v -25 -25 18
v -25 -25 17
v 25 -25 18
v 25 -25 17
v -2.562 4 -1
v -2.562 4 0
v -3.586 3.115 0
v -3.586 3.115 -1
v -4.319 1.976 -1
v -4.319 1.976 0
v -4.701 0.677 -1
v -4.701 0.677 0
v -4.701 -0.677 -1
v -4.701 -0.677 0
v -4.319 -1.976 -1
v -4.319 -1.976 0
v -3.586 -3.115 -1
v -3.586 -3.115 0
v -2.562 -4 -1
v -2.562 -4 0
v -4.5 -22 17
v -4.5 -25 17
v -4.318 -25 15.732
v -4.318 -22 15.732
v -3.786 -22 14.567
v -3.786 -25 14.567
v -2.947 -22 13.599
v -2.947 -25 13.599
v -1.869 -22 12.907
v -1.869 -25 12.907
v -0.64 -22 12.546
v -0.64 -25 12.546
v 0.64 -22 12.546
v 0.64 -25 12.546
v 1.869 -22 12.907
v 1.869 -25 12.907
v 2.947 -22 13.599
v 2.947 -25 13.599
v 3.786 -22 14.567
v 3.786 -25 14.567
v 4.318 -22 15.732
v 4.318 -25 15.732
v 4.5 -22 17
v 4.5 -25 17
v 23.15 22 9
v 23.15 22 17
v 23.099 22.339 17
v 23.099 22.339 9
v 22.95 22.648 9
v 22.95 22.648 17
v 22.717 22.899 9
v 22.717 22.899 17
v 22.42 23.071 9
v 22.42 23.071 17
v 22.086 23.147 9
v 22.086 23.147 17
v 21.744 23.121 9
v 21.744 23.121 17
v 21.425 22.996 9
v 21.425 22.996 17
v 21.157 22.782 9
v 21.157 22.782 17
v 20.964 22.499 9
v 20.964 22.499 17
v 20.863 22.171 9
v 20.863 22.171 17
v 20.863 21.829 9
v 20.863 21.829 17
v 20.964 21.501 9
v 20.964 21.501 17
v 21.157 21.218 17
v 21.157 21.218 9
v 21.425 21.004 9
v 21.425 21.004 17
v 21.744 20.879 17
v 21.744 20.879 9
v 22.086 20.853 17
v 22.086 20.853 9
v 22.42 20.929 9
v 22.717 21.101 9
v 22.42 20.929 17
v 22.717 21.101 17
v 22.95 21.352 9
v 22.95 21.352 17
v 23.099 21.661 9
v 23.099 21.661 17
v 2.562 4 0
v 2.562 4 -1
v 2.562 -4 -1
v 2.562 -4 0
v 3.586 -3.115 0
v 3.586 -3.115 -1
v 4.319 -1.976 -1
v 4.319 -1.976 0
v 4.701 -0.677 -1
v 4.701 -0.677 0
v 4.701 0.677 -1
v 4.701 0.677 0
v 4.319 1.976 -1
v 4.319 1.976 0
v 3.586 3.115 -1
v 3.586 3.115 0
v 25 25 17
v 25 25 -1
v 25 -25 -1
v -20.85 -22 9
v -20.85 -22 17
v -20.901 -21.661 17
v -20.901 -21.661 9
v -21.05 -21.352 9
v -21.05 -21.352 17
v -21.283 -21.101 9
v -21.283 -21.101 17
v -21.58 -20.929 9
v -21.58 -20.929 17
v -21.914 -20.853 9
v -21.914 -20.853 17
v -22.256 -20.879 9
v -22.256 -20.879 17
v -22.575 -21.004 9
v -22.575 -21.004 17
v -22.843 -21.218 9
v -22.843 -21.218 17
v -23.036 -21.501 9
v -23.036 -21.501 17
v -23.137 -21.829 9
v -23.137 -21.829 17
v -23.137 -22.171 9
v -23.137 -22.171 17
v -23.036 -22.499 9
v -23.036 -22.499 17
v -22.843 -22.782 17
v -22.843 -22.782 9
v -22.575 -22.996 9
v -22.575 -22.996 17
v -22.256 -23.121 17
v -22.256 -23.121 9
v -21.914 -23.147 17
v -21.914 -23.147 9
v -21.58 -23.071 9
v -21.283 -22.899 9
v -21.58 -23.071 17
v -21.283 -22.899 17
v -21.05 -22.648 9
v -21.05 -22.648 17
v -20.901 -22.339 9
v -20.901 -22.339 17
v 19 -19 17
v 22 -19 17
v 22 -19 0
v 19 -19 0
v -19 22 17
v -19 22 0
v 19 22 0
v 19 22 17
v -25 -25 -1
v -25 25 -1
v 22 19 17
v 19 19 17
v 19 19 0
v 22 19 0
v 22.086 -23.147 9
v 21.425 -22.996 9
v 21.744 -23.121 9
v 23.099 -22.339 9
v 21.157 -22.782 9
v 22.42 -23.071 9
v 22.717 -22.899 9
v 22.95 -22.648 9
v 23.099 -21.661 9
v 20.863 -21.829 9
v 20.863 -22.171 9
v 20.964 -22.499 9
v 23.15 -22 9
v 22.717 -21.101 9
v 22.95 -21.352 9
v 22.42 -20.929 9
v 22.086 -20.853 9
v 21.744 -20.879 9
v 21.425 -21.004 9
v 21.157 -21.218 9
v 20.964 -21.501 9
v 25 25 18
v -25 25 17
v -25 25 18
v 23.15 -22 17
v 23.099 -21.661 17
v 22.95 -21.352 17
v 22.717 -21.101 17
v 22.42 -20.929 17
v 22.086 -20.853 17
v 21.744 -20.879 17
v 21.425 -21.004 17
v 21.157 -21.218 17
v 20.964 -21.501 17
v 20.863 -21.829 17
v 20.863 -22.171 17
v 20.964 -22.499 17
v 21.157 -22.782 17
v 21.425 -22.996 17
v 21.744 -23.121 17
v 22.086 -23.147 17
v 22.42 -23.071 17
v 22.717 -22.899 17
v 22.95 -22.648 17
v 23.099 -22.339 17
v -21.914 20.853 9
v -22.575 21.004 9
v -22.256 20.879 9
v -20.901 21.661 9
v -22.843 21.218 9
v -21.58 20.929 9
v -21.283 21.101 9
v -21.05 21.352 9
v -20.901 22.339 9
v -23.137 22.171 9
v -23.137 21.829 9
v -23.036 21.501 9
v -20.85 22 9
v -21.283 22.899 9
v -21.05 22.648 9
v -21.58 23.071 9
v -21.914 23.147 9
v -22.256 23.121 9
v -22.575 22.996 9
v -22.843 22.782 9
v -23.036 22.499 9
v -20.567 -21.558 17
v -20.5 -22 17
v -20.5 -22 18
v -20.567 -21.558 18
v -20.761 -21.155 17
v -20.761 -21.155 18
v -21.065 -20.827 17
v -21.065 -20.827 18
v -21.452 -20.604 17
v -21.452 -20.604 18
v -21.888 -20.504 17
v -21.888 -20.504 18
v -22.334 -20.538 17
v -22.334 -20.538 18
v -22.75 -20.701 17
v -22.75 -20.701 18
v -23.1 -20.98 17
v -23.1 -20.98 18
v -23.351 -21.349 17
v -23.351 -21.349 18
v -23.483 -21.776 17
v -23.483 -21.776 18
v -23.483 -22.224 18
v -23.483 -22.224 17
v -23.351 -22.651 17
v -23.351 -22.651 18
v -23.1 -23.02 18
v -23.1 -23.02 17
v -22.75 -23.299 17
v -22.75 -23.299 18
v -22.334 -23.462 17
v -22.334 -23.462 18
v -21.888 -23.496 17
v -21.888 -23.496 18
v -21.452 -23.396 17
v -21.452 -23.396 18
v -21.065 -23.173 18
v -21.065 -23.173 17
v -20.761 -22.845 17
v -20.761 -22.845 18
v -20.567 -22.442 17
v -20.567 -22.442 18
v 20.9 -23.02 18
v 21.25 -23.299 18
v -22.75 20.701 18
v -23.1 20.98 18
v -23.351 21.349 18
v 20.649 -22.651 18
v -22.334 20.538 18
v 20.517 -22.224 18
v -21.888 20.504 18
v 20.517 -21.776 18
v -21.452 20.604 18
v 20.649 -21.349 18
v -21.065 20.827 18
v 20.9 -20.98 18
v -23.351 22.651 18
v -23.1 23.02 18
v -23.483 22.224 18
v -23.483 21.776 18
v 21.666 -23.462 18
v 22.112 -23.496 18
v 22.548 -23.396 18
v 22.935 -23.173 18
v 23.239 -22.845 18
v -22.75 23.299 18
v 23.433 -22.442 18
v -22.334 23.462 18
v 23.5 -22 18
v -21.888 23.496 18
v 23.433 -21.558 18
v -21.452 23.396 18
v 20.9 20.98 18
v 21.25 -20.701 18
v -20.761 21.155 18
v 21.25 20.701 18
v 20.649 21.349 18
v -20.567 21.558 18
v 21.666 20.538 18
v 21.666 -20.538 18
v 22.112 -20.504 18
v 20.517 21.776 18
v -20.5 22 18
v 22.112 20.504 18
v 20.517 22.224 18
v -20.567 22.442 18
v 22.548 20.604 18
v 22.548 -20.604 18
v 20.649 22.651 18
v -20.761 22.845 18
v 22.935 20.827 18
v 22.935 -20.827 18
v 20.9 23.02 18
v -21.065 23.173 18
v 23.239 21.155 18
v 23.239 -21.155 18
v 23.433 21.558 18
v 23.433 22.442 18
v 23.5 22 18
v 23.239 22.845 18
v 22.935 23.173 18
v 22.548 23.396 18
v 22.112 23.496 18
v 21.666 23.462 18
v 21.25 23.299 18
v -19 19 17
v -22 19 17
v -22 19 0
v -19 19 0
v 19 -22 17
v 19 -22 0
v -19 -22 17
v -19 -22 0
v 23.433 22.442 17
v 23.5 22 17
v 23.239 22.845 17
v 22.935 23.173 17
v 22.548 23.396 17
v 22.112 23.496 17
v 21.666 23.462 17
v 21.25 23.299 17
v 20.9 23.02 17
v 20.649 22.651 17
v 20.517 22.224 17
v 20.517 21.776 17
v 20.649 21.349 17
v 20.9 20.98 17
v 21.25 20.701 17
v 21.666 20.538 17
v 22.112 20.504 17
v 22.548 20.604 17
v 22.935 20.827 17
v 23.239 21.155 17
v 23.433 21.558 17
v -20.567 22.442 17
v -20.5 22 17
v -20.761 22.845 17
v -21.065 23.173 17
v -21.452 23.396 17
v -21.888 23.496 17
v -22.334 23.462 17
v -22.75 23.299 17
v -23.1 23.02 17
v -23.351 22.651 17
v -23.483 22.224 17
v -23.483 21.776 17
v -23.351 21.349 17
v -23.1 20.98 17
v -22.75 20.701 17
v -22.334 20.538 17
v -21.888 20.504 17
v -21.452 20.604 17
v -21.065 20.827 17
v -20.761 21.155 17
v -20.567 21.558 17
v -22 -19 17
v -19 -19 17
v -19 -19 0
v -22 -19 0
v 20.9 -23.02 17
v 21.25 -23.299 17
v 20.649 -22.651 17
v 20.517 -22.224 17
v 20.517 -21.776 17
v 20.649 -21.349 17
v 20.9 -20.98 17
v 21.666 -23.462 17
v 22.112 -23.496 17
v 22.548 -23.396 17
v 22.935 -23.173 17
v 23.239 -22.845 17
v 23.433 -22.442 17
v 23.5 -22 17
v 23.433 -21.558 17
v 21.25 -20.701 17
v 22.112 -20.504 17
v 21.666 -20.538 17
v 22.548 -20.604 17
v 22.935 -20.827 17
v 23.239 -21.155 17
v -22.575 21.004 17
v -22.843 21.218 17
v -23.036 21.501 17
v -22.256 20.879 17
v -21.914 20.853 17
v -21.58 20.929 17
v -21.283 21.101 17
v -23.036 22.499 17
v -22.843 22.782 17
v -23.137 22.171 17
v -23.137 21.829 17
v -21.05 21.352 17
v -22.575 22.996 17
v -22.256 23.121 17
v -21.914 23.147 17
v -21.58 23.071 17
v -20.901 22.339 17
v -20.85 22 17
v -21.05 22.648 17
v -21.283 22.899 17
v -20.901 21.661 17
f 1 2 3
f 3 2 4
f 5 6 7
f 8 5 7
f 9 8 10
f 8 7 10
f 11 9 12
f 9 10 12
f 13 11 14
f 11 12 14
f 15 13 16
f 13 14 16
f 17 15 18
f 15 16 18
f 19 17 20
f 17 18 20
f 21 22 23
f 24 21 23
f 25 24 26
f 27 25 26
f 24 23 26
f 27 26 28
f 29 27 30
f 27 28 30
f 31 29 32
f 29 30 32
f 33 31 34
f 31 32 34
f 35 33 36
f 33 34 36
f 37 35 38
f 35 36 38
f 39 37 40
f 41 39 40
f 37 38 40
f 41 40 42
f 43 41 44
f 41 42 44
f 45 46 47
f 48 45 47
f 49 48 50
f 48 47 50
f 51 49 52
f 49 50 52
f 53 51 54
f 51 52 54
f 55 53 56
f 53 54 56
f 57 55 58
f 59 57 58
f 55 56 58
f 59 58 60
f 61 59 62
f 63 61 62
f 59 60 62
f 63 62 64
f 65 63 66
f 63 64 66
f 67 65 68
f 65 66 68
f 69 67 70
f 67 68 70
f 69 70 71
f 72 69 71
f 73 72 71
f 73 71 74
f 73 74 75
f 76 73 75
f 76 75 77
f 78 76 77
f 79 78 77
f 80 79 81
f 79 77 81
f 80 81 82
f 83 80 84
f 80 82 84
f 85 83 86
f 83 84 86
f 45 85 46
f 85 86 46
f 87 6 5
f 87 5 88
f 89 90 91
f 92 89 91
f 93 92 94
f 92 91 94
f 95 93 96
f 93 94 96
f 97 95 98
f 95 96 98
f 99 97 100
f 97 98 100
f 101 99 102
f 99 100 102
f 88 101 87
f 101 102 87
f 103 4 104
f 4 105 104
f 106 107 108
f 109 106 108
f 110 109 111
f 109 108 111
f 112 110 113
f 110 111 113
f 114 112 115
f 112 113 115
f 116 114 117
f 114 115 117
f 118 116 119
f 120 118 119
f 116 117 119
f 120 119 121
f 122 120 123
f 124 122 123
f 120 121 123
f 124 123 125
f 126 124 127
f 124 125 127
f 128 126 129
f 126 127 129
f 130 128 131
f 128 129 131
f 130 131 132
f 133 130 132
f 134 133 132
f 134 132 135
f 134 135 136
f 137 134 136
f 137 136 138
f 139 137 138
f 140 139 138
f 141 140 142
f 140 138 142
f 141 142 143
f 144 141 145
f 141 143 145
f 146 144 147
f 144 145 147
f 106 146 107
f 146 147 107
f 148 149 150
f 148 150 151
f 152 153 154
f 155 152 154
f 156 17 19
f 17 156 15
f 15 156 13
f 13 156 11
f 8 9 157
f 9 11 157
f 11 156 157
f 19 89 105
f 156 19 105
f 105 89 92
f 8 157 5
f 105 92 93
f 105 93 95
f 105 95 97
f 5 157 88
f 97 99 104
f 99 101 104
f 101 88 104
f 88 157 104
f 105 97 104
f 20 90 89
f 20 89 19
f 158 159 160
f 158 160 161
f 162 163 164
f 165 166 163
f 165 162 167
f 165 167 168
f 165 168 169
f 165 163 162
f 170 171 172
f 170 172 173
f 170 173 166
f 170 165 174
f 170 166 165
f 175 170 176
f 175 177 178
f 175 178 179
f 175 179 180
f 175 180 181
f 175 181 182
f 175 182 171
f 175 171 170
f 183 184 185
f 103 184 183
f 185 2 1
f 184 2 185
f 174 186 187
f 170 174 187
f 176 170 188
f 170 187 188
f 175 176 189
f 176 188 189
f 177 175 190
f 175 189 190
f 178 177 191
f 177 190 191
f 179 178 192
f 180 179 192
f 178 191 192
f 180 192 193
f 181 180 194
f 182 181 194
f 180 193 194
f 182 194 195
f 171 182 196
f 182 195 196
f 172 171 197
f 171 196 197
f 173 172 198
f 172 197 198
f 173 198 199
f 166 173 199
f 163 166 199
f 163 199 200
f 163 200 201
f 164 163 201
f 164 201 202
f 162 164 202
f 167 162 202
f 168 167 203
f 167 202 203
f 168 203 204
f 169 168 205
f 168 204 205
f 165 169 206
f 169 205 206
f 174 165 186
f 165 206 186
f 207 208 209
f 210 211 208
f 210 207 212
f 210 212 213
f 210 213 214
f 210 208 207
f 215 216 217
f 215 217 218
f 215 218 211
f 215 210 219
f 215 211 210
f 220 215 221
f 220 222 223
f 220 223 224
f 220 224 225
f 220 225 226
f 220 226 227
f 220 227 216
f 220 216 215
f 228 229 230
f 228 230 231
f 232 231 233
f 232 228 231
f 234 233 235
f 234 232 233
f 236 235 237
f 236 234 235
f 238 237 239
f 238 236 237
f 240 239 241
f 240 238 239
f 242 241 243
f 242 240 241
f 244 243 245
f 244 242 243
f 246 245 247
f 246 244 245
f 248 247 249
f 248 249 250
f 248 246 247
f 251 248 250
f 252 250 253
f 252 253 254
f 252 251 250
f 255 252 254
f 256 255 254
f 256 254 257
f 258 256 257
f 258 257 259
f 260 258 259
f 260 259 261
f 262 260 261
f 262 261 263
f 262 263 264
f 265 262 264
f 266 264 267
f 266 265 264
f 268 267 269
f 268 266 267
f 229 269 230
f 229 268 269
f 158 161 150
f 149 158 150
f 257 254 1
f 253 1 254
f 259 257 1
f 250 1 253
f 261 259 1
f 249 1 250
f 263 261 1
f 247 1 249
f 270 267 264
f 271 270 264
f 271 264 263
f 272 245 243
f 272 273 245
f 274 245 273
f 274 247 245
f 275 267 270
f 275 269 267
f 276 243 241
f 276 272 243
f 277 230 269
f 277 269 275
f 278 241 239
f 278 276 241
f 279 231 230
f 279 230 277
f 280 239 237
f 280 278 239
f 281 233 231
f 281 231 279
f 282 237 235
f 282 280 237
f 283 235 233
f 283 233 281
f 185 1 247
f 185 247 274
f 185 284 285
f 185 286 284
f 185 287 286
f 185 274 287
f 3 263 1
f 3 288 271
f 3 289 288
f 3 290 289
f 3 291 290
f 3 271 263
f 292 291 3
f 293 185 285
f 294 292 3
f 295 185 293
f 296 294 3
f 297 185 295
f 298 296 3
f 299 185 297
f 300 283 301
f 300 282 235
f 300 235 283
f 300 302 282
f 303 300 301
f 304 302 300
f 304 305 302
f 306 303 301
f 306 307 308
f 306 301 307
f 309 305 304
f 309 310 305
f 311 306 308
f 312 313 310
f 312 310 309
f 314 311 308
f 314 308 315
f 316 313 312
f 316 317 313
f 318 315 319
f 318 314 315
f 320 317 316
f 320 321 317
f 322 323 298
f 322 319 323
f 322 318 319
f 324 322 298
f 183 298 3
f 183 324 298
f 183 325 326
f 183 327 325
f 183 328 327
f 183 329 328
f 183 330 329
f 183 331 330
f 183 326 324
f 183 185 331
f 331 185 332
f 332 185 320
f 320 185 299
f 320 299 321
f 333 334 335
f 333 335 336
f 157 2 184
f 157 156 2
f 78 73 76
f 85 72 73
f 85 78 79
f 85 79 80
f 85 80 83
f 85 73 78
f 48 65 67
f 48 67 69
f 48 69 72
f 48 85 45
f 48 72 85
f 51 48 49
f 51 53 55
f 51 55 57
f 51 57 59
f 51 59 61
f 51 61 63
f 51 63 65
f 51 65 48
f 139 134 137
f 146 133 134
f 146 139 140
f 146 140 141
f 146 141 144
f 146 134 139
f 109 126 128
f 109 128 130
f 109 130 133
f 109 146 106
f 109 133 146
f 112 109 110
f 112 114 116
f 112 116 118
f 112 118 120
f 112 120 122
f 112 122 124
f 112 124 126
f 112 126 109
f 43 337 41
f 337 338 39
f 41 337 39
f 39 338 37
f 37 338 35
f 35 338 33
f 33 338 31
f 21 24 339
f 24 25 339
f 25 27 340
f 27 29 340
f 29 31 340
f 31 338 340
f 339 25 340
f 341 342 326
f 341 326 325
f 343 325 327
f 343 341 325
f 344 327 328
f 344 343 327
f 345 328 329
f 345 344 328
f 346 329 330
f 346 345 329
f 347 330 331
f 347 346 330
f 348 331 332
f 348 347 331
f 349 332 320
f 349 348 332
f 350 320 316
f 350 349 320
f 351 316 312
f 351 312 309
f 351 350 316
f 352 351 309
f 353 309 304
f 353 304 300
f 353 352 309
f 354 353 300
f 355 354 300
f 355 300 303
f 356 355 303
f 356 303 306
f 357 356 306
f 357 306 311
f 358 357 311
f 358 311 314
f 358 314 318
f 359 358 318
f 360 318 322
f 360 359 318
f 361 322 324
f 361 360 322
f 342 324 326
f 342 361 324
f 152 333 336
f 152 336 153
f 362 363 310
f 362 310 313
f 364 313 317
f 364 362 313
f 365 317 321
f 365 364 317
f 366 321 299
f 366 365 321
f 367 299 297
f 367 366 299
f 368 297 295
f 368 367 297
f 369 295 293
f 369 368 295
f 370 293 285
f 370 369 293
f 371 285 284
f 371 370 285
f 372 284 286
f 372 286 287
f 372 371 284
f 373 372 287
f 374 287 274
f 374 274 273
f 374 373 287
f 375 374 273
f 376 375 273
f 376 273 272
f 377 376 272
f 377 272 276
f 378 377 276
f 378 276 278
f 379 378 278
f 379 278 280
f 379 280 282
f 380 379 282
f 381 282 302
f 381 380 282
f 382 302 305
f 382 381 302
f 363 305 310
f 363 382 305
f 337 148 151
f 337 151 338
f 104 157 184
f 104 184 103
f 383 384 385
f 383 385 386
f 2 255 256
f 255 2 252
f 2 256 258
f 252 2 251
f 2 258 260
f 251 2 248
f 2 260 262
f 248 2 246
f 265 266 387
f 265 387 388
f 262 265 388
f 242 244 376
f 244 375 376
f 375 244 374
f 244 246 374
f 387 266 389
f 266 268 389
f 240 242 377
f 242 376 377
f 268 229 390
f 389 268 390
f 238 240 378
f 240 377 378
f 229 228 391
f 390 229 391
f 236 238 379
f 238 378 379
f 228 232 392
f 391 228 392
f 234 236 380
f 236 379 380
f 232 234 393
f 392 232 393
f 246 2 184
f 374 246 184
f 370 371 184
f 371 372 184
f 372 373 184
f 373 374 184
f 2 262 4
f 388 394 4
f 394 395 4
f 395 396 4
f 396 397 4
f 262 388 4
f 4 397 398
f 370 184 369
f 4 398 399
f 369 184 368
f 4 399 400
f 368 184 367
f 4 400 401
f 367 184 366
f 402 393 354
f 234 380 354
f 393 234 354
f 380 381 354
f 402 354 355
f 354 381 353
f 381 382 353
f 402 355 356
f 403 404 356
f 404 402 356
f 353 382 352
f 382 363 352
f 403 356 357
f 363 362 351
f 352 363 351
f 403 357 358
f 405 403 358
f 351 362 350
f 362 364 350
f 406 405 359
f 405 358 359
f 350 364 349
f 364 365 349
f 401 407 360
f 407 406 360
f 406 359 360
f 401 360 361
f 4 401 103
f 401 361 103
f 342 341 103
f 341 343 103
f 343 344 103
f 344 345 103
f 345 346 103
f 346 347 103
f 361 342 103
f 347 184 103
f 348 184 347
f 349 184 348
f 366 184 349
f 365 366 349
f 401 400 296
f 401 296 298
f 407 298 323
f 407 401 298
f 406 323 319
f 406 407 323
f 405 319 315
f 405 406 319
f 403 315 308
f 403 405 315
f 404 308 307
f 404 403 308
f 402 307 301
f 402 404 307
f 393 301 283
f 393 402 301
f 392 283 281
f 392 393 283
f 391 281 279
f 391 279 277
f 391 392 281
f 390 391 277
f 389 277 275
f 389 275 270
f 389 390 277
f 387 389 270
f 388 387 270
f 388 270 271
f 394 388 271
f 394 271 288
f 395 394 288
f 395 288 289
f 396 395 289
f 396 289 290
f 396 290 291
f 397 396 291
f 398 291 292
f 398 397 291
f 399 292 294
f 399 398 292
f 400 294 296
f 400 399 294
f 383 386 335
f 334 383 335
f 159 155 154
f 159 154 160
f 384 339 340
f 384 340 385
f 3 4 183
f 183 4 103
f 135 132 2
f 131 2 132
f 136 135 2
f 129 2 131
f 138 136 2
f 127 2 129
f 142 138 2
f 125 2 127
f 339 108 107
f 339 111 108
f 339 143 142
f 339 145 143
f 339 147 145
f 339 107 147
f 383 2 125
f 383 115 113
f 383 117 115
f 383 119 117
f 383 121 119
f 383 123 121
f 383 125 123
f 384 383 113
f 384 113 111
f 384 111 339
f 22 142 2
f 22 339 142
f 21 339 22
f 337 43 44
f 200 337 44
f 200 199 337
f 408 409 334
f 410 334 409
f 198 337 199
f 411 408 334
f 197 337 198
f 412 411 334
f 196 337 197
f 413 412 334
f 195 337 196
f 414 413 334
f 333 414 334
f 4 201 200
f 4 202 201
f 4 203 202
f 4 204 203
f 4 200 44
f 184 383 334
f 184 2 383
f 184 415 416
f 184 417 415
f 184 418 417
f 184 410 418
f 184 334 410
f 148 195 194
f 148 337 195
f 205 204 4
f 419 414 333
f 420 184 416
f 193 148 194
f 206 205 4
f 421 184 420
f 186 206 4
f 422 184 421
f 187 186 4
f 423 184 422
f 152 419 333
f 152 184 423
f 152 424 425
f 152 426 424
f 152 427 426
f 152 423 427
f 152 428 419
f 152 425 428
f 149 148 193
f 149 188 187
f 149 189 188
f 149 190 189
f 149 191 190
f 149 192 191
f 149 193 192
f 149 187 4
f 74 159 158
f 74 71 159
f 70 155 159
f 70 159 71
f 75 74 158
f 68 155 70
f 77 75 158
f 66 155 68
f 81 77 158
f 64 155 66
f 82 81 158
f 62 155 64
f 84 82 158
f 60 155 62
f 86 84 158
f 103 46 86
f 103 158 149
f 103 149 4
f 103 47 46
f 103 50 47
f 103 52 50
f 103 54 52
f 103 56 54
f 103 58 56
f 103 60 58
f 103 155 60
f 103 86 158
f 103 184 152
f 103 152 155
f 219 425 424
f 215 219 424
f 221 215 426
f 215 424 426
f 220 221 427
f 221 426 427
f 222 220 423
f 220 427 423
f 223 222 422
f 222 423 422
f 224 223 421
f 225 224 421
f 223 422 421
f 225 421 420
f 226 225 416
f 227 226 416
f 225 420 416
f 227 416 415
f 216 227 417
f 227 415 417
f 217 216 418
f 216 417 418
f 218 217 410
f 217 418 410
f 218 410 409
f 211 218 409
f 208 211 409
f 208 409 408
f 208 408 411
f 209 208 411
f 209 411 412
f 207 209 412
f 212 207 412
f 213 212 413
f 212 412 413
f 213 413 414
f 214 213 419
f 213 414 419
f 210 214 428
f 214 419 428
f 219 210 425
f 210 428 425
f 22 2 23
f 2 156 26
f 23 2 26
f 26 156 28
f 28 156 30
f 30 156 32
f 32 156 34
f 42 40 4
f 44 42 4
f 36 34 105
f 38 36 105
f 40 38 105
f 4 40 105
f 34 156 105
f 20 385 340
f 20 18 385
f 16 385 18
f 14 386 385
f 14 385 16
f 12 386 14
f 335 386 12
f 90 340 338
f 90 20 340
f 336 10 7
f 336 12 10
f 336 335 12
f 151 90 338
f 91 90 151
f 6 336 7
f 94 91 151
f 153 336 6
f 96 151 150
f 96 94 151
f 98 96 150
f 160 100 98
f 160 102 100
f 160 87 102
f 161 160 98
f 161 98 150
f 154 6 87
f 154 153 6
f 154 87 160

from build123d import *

# Parameters (mm, degrees)
SKETCH_W        = 50
SKETCH_H        = 50
PAD_DEPTH       = 1
SKETCH001_W     = 50
SKETCH001_H     = 50
PAD001_DEPTH    = 17
SKETCH002_R     = 1.15
POCKET_DEPTH    = 8
POCKET001_DEPTH = 3
SKETCH004_W     = 50
SKETCH004_H     = 50
SKETCH004_R     = 1.5
PAD002_DEPTH    = 1


with BuildPart() as main_box:
    # Sketch → Pad (new body)
    with BuildSketch(Plane.XY):
        Rectangle(SKETCH_W, SKETCH_H)
        with BuildLine():
            ThreePointArc((-2.561738, 4), (-4.75, 0), (-2.561738, -4))
            Line((2.561738, -4), (-2.561738, -4))
            ThreePointArc((2.561738, -4), (4.75, 0), (2.561738, 4))
            Line((-2.561738, 4), (2.561738, 4))
        make_face(mode=Mode.SUBTRACT)
    extrude(amount=-PAD_DEPTH)

    # Sketch001 → Pad001 (join)
    with BuildSketch(Plane.XY):
        Rectangle(SKETCH001_W, SKETCH001_H)
        Polygon((-19, 22), (19, 22), (19, 19), (22, 19), (22, -19), (19, -19), (19, -22), (-19, -22), (-19, -19), (-22, -19), (-22, 19), (-19, 19), align=None, mode=Mode.SUBTRACT)
    extrude(amount=PAD001_DEPTH)

    # Sketch002 (on Face9 of Pad001) → Pocket (cut)
    with BuildSketch(Plane.XY.offset(17)):
        with Locations((-22, 22)):
            Circle(SKETCH002_R)
        with Locations((22, 22)):
            Circle(SKETCH002_R)
        with Locations((-22, -22)):
            Circle(SKETCH002_R)
        with Locations((22, -22)):
            Circle(SKETCH002_R)
    extrude(amount=-POCKET_DEPTH, mode=Mode.SUBTRACT)

    # Sketch003 (on Face14 of Pocket) → Pocket001 (cut)
    with BuildSketch(Plane.XZ.offset(25)):
        with BuildLine():
            ThreePointArc((-4.5, 17), (0, 12.5), (4.5, 17))
            Line((-4.5, 17), (4.5, 17))
        make_face()
    extrude(amount=-POCKET001_DEPTH, mode=Mode.SUBTRACT)


with BuildPart() as cover:
    # Sketch004 → Pad002 (new body)
    with BuildSketch(Plane.XY.offset(17)):
        Rectangle(SKETCH004_W, SKETCH004_H)
        with Locations((-22, 22)):
            Circle(SKETCH004_R, mode=Mode.SUBTRACT)
        with Locations((22, 22)):
            Circle(SKETCH004_R, mode=Mode.SUBTRACT)
        with Locations((22, -22)):
            Circle(SKETCH004_R, mode=Mode.SUBTRACT)
        with Locations((-22, -22)):
            Circle(SKETCH004_R, mode=Mode.SUBTRACT)
    extrude(amount=PAD002_DEPTH)


solid = Compound([main_box.part, cover.part])
